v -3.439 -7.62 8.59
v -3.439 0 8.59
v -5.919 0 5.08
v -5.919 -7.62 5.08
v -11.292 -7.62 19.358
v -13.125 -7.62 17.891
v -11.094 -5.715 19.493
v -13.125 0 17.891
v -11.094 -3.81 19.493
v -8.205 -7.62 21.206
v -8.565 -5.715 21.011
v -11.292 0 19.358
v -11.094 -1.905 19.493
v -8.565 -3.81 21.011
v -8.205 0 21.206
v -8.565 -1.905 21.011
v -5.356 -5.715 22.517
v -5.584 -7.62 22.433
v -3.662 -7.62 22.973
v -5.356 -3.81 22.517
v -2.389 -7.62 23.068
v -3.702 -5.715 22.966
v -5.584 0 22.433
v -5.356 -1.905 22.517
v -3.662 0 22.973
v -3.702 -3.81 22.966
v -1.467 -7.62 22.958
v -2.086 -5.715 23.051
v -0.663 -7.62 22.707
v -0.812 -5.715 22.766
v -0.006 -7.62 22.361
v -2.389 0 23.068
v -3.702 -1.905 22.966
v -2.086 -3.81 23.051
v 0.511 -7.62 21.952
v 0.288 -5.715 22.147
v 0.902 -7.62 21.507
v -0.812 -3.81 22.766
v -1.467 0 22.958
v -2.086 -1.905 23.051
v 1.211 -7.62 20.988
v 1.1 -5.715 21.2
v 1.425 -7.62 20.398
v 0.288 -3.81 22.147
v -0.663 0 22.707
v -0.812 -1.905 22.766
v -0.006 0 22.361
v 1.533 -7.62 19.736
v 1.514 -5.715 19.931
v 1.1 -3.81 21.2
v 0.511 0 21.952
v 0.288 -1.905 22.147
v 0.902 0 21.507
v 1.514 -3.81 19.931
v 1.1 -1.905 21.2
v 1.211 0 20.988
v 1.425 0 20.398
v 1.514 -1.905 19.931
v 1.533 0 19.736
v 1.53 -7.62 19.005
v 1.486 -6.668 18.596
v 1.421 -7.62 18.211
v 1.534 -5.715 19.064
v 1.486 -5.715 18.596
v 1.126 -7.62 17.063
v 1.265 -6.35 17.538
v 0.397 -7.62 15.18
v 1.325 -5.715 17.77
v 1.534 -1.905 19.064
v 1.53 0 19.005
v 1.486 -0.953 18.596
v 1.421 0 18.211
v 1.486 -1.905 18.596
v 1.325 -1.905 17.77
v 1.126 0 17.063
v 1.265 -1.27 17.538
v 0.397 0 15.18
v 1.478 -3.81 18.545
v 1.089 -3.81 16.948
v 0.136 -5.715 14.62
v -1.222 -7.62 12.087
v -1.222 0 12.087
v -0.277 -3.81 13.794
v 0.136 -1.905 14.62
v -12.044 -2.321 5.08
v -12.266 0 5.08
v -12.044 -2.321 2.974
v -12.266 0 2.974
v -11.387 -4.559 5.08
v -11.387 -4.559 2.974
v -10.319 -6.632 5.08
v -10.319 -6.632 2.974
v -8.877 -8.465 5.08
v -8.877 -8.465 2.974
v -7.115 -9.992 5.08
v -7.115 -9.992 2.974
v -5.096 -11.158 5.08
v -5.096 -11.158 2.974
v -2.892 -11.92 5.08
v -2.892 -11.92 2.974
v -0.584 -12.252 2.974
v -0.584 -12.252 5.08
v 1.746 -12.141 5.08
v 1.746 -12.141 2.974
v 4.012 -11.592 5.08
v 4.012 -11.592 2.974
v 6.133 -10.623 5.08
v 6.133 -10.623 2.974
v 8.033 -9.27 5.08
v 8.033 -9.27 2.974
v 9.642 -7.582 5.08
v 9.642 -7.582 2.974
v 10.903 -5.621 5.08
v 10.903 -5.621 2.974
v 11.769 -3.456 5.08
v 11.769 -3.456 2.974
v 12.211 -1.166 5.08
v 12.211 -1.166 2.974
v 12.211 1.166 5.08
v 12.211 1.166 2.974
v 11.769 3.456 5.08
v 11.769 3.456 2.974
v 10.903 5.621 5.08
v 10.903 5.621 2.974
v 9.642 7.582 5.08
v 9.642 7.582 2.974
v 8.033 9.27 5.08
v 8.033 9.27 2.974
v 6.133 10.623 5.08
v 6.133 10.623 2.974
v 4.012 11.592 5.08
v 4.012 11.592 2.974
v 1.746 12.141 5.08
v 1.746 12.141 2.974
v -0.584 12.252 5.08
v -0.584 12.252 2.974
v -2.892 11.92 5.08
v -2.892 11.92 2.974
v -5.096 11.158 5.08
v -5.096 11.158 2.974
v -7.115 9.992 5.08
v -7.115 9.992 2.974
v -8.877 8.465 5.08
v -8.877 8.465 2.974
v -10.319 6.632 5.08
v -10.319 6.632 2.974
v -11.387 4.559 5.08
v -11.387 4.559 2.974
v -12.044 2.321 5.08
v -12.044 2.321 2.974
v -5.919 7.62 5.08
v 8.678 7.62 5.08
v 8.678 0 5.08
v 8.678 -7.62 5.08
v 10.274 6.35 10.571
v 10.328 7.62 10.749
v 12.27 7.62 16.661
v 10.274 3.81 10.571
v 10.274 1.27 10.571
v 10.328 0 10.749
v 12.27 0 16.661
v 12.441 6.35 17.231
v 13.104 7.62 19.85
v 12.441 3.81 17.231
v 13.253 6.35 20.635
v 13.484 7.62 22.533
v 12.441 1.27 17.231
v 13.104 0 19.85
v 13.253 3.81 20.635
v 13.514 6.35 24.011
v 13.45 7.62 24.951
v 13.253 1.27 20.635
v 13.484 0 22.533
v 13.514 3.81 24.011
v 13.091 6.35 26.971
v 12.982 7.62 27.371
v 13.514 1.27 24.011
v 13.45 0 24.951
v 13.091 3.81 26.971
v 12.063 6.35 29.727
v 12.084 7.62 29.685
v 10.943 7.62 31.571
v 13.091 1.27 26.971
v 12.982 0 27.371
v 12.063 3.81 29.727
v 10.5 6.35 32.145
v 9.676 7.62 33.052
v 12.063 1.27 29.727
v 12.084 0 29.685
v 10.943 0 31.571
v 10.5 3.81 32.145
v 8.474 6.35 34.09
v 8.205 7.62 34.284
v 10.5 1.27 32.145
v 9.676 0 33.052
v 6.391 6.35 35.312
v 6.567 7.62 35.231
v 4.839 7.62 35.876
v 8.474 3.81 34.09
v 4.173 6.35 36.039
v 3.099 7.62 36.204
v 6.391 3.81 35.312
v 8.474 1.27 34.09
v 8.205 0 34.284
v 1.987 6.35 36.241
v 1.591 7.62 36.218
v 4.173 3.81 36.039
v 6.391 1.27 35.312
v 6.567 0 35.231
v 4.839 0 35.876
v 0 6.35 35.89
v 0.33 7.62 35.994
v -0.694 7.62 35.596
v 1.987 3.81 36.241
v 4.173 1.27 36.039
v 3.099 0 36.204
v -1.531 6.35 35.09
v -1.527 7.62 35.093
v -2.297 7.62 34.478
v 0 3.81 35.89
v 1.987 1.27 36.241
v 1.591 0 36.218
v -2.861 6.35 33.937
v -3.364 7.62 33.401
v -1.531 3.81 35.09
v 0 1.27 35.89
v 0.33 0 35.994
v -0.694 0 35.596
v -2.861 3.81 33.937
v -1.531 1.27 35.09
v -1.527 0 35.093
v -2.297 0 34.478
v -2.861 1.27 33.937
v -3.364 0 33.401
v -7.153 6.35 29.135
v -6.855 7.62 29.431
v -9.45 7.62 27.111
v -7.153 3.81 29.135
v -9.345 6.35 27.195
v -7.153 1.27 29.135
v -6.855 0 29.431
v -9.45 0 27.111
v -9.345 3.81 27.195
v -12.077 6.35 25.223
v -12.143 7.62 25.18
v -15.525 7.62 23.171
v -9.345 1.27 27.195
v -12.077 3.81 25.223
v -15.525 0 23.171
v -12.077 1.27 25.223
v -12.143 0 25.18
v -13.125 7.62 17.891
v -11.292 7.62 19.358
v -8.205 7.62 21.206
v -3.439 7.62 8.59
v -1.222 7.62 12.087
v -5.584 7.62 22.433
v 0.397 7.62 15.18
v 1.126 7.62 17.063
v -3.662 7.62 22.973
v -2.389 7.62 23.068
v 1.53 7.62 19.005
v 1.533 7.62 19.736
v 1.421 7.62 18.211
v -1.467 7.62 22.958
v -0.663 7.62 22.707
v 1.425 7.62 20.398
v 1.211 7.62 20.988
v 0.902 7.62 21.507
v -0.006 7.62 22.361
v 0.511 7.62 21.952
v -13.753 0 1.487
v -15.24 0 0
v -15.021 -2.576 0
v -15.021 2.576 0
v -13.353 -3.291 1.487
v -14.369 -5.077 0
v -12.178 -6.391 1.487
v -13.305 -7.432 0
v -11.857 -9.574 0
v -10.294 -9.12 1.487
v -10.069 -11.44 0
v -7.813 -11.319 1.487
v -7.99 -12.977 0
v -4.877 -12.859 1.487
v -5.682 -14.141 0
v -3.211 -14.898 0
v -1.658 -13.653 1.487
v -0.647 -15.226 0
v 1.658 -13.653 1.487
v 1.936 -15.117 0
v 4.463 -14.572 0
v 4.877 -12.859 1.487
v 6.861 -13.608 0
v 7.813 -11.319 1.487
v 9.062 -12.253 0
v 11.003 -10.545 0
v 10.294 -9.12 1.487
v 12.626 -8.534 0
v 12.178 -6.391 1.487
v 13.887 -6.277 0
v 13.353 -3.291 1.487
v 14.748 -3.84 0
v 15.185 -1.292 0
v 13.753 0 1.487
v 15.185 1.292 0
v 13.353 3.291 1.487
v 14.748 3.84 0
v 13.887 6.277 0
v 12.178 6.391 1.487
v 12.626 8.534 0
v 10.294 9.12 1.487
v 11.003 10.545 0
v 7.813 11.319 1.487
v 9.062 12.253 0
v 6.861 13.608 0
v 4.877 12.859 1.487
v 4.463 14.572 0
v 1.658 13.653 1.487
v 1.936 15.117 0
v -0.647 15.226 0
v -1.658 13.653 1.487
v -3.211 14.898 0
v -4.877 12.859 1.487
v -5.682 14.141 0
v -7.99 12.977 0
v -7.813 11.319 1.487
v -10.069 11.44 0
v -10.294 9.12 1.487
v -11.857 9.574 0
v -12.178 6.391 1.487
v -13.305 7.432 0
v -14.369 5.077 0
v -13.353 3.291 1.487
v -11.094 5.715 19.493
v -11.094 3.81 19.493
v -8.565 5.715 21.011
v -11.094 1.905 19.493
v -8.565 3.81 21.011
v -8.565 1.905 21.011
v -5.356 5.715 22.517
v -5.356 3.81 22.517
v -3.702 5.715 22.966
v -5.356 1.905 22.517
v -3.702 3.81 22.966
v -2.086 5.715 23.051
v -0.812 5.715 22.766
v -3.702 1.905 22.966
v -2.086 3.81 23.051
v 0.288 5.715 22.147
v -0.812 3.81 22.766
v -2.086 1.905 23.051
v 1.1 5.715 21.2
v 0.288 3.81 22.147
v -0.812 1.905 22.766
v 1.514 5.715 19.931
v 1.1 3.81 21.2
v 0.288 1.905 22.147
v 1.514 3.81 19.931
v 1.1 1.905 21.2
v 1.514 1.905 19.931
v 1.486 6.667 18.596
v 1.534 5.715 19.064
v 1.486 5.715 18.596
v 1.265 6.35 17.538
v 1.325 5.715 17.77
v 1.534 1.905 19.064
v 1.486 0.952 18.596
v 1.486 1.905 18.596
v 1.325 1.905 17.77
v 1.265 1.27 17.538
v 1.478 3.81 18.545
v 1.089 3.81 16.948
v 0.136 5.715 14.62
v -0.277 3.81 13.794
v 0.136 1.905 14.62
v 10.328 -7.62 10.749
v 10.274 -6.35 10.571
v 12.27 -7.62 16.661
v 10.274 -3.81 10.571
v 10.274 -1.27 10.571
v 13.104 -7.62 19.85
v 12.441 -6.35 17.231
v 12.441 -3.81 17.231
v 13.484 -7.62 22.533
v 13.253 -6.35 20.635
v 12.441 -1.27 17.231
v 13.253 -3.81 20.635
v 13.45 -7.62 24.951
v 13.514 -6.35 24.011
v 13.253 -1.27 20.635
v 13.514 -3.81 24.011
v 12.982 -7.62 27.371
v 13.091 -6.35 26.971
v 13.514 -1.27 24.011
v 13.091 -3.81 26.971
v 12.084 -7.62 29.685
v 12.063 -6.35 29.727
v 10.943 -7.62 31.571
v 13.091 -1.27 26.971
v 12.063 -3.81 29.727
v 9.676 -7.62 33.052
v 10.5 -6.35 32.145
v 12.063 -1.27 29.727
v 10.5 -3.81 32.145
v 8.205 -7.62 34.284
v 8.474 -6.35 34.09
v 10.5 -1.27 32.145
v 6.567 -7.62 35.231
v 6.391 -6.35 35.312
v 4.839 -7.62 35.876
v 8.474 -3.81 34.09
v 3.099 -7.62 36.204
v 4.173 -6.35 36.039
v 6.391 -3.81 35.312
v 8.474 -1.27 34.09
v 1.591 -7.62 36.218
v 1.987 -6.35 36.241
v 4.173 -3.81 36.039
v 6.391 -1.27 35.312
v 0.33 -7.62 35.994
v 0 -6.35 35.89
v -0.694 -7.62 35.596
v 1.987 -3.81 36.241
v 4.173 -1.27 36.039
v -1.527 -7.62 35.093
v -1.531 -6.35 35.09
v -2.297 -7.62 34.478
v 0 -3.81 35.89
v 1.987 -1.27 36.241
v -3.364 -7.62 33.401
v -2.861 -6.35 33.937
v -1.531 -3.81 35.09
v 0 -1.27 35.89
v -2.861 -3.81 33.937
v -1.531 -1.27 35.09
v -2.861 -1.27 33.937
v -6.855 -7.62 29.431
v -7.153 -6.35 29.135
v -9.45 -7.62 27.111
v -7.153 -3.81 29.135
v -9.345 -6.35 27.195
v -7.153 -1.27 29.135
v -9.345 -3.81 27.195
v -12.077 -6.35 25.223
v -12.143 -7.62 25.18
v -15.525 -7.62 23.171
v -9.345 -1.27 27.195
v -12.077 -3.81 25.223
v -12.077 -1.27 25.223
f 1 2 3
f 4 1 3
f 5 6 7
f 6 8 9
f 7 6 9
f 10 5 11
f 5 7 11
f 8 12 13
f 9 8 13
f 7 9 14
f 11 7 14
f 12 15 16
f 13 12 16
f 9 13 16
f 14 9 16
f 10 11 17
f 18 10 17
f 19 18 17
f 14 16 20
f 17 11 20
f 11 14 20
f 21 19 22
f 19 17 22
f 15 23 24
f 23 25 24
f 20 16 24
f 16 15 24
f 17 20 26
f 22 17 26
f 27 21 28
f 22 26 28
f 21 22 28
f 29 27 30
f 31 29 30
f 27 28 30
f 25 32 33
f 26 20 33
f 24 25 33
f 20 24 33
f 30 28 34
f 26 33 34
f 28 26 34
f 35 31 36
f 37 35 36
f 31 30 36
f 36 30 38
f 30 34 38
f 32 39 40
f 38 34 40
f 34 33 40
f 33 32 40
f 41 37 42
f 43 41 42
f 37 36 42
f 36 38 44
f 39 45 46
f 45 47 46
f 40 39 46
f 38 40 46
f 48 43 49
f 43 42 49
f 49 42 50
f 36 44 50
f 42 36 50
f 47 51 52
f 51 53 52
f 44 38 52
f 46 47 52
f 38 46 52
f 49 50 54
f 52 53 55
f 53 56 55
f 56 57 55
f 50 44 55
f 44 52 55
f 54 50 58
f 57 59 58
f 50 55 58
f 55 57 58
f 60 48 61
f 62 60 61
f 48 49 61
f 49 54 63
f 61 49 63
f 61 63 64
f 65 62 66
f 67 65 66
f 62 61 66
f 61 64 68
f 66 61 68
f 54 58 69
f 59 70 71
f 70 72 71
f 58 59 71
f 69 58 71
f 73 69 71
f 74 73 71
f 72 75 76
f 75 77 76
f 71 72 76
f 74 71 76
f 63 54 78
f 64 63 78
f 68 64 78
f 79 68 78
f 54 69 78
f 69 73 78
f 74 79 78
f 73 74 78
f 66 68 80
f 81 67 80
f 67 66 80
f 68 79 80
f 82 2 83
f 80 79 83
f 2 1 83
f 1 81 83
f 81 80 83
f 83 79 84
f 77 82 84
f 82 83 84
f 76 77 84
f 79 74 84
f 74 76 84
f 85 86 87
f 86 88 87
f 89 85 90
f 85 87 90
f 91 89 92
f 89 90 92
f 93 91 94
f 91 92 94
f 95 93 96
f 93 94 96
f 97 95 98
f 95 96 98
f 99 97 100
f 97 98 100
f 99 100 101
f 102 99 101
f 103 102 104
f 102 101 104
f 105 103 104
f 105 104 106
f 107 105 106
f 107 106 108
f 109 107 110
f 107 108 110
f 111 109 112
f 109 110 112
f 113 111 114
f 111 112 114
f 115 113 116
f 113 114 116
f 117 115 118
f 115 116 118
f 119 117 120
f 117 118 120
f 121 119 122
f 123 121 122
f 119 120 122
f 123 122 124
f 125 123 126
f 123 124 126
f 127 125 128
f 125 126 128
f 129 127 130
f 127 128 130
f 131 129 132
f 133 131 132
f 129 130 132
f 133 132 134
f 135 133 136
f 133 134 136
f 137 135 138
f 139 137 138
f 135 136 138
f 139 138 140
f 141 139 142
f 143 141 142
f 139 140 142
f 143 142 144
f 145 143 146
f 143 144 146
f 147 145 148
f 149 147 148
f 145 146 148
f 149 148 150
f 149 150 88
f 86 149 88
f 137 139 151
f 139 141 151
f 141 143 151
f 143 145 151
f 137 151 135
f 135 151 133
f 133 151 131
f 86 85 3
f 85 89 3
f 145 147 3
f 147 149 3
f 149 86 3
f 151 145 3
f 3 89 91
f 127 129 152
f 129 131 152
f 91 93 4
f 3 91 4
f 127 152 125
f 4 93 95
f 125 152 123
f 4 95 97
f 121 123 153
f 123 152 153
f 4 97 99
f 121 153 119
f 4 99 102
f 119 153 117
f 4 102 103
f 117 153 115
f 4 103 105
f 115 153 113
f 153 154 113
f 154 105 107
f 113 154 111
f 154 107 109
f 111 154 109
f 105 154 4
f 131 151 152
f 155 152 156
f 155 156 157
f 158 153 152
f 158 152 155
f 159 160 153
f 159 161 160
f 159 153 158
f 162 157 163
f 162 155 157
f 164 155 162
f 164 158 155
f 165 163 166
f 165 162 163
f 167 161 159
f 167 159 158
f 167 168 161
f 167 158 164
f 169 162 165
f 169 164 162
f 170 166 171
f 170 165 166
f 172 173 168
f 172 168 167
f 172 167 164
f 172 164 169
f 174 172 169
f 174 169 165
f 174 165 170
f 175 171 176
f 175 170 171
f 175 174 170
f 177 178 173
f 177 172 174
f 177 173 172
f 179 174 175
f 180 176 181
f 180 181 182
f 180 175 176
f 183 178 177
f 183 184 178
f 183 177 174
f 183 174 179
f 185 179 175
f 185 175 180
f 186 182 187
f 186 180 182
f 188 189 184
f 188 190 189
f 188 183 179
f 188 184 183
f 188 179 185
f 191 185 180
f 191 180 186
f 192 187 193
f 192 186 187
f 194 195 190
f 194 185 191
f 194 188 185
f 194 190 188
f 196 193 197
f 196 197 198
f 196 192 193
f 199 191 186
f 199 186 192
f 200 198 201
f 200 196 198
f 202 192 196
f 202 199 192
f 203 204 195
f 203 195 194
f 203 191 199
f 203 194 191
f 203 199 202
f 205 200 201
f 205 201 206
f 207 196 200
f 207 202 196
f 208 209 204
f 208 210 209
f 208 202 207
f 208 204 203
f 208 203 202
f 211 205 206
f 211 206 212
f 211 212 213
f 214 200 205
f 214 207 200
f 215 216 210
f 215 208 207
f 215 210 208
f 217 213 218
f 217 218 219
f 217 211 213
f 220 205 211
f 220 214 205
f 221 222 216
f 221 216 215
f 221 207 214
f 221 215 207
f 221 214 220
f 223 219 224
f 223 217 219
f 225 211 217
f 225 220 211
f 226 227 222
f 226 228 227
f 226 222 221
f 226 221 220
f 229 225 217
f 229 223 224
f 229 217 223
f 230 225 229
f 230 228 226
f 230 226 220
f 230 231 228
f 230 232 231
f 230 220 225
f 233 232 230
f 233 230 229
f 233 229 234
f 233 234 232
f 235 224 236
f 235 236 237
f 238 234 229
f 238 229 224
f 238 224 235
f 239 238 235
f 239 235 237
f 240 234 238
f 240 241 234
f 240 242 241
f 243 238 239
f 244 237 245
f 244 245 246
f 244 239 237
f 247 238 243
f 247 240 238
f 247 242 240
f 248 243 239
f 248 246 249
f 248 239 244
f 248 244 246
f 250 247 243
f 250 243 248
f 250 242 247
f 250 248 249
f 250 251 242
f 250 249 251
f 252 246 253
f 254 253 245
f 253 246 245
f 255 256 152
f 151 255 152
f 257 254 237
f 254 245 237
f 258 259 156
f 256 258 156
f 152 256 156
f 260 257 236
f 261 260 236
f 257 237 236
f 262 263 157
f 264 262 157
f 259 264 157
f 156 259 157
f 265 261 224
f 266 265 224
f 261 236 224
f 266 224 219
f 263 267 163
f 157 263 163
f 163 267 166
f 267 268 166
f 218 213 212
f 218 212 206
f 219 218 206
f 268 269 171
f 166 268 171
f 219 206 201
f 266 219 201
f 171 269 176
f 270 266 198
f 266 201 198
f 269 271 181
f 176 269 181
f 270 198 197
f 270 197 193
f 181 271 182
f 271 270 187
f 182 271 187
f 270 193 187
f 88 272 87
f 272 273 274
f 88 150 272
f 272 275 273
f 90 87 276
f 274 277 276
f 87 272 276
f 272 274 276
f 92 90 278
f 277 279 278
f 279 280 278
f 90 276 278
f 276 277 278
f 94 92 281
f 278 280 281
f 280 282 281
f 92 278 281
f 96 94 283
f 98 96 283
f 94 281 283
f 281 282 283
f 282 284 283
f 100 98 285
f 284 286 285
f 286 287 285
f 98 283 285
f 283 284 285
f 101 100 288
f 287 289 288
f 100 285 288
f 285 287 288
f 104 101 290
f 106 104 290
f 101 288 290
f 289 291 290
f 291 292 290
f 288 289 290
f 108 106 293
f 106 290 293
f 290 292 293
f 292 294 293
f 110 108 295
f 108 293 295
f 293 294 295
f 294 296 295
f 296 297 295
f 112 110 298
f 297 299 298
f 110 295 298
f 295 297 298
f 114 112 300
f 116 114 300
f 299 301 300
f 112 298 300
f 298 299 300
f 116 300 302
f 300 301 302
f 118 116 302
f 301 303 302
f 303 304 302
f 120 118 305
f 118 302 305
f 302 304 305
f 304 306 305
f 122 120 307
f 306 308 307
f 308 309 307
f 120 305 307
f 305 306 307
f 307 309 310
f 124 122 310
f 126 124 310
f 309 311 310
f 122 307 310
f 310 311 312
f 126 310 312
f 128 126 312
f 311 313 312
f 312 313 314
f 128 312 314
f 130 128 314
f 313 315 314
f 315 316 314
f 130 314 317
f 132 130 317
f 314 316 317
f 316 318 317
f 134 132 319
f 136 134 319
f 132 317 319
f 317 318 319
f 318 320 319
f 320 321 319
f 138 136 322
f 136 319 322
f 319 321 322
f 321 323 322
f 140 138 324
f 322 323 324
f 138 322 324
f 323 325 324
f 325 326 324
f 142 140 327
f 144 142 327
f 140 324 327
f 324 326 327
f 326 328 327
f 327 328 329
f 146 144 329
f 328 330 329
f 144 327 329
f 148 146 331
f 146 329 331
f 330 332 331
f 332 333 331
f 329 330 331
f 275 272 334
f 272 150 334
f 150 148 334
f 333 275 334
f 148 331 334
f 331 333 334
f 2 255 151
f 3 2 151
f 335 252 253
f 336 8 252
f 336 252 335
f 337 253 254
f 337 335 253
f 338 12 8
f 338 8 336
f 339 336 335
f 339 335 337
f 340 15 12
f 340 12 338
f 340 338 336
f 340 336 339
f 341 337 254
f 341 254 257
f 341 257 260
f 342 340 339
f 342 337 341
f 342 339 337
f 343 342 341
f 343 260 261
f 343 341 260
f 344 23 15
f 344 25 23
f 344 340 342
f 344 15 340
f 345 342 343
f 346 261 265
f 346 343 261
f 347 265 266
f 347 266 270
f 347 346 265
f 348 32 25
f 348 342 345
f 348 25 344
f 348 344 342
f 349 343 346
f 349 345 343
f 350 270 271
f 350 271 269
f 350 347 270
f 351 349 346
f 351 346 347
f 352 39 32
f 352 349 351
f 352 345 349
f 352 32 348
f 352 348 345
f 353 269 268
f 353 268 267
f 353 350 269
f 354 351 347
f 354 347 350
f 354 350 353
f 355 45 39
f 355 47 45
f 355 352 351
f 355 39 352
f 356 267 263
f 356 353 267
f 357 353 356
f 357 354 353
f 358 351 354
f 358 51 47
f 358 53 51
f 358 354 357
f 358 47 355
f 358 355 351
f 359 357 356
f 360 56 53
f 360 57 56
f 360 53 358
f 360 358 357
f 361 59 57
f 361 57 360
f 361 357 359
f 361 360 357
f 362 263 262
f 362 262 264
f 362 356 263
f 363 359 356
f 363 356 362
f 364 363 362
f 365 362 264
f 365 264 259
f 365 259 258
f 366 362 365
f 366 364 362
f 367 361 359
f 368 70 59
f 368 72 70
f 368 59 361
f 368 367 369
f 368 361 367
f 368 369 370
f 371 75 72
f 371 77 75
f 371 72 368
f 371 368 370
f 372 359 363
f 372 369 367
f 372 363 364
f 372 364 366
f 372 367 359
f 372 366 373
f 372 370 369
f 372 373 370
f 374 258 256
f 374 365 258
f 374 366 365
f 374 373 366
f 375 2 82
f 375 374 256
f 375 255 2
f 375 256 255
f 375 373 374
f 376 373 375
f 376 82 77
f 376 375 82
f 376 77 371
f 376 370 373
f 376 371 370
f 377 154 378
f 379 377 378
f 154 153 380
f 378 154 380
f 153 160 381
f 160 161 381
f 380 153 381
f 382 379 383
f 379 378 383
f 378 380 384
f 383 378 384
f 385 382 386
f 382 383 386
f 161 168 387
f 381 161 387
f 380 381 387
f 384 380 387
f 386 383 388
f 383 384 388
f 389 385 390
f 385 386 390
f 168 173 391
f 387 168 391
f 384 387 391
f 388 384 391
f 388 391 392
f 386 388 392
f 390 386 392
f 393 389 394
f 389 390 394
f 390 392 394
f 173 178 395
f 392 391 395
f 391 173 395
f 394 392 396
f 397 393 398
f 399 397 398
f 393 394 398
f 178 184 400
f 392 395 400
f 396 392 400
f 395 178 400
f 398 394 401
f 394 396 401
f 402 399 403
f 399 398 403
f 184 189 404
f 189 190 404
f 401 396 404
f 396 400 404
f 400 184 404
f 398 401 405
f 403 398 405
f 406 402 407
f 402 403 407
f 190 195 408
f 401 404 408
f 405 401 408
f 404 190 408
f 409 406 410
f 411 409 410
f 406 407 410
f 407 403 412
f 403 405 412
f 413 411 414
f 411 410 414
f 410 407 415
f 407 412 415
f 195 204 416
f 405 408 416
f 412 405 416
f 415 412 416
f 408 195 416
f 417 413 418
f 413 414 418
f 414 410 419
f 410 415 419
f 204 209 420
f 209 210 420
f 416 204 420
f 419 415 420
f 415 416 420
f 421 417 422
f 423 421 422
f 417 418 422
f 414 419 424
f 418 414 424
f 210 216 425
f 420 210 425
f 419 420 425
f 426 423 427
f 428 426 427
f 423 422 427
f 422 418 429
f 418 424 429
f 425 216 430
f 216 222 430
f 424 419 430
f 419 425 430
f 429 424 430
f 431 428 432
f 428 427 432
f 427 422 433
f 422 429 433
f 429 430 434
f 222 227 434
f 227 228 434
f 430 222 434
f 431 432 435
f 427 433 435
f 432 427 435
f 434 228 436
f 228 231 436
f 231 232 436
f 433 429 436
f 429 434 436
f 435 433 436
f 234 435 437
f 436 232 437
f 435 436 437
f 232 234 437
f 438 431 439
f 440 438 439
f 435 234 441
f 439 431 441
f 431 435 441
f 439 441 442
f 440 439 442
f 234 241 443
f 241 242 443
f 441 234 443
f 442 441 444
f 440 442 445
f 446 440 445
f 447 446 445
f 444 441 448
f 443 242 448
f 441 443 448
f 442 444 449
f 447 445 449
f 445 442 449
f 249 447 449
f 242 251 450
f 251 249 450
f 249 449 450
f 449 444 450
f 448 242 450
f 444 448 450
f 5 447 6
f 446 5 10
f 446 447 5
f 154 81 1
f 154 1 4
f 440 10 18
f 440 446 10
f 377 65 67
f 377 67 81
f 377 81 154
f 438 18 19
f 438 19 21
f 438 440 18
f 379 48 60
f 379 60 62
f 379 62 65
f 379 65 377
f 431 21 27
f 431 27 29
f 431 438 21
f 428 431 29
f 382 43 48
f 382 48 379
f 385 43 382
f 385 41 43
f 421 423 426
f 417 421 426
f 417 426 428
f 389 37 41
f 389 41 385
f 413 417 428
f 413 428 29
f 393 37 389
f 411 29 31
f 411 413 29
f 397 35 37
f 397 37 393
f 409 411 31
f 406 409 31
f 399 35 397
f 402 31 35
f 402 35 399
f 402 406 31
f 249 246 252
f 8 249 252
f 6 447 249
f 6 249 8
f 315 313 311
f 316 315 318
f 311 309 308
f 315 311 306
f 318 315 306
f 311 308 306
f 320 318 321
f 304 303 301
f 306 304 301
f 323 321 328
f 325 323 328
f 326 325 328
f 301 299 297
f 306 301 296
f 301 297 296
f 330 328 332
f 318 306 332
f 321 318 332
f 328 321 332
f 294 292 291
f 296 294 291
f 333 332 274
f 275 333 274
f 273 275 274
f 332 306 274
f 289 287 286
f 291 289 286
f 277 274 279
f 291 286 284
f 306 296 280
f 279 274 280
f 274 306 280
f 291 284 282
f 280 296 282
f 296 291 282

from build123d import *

# Parameters (mm, degrees)
F3_DEPTH      = 7.62
F3_DEPTH_BACK = 7.62


with BuildPart() as f1:
    # F0 (on Front) → F1 (revolve)
    with BuildSketch(Plane.XZ):
        Polygon((-15.24, 0), (0, 0), (0, 5.08), (-12.2661314196, 5.08), (-12.2661314196, 2.9738685804), align=None)
    revolve(axis=Axis((0, 0, 2.54), (0, 0, 1)))

    # F2 (on Front) → F3 (join, two sides)
    with BuildSketch(Plane.XZ) as f3_sk:
        with BuildLine():
            Line((-7.3416769874, 3.1662012553), (0, 3.3688344993))
            Line((0, 3.3688344993), (7.2427706889, 2.150822198))
            add(Edge.make_bspline(
                [(7.2427706889, 2.150822198), (8.6428351263, 3.9097056358), (9.9262974456, 11.0974441008), (15.5228182491, 23.7855183633), (9.76106866, 35.2336628085), (-0.6690425446, 37.380866027), (-5.5282984066, 30.2920788624), (-10.3723574545, 25.9812829784), (-15.524928458, 23.1707897037)],
                knots=[0, 0, 0, 0, 0.1551569571, 0.3479952539, 0.5221030276, 0.6747550055, 0.8136250582, 1, 1, 1, 1], degree=3))
            Line((-15.524928458, 23.1707897037), (-13.1250545382, 17.8910661489))
            add(Edge.make_bspline(
                [(-13.1250545382, 17.8910661489), (-11.9614680408, 19.0059994408), (-8.6537195801, 21.1199080777), (-2.2295121867, 24.1652797338), (4.4671287418, 19.7165806832), (-2.965693025, 8.9804379749), (-7.3416769874, 3.1662012553)],
                knots=[0, 0, 0, 0, 0.2045034732, 0.4312672546, 0.6211588488, 1, 1, 1, 1], degree=3))
        make_face()
    extrude(amount=F3_DEPTH)
    extrude(f3_sk.sketch, amount=-F3_DEPTH_BACK)


solid = f1.part
